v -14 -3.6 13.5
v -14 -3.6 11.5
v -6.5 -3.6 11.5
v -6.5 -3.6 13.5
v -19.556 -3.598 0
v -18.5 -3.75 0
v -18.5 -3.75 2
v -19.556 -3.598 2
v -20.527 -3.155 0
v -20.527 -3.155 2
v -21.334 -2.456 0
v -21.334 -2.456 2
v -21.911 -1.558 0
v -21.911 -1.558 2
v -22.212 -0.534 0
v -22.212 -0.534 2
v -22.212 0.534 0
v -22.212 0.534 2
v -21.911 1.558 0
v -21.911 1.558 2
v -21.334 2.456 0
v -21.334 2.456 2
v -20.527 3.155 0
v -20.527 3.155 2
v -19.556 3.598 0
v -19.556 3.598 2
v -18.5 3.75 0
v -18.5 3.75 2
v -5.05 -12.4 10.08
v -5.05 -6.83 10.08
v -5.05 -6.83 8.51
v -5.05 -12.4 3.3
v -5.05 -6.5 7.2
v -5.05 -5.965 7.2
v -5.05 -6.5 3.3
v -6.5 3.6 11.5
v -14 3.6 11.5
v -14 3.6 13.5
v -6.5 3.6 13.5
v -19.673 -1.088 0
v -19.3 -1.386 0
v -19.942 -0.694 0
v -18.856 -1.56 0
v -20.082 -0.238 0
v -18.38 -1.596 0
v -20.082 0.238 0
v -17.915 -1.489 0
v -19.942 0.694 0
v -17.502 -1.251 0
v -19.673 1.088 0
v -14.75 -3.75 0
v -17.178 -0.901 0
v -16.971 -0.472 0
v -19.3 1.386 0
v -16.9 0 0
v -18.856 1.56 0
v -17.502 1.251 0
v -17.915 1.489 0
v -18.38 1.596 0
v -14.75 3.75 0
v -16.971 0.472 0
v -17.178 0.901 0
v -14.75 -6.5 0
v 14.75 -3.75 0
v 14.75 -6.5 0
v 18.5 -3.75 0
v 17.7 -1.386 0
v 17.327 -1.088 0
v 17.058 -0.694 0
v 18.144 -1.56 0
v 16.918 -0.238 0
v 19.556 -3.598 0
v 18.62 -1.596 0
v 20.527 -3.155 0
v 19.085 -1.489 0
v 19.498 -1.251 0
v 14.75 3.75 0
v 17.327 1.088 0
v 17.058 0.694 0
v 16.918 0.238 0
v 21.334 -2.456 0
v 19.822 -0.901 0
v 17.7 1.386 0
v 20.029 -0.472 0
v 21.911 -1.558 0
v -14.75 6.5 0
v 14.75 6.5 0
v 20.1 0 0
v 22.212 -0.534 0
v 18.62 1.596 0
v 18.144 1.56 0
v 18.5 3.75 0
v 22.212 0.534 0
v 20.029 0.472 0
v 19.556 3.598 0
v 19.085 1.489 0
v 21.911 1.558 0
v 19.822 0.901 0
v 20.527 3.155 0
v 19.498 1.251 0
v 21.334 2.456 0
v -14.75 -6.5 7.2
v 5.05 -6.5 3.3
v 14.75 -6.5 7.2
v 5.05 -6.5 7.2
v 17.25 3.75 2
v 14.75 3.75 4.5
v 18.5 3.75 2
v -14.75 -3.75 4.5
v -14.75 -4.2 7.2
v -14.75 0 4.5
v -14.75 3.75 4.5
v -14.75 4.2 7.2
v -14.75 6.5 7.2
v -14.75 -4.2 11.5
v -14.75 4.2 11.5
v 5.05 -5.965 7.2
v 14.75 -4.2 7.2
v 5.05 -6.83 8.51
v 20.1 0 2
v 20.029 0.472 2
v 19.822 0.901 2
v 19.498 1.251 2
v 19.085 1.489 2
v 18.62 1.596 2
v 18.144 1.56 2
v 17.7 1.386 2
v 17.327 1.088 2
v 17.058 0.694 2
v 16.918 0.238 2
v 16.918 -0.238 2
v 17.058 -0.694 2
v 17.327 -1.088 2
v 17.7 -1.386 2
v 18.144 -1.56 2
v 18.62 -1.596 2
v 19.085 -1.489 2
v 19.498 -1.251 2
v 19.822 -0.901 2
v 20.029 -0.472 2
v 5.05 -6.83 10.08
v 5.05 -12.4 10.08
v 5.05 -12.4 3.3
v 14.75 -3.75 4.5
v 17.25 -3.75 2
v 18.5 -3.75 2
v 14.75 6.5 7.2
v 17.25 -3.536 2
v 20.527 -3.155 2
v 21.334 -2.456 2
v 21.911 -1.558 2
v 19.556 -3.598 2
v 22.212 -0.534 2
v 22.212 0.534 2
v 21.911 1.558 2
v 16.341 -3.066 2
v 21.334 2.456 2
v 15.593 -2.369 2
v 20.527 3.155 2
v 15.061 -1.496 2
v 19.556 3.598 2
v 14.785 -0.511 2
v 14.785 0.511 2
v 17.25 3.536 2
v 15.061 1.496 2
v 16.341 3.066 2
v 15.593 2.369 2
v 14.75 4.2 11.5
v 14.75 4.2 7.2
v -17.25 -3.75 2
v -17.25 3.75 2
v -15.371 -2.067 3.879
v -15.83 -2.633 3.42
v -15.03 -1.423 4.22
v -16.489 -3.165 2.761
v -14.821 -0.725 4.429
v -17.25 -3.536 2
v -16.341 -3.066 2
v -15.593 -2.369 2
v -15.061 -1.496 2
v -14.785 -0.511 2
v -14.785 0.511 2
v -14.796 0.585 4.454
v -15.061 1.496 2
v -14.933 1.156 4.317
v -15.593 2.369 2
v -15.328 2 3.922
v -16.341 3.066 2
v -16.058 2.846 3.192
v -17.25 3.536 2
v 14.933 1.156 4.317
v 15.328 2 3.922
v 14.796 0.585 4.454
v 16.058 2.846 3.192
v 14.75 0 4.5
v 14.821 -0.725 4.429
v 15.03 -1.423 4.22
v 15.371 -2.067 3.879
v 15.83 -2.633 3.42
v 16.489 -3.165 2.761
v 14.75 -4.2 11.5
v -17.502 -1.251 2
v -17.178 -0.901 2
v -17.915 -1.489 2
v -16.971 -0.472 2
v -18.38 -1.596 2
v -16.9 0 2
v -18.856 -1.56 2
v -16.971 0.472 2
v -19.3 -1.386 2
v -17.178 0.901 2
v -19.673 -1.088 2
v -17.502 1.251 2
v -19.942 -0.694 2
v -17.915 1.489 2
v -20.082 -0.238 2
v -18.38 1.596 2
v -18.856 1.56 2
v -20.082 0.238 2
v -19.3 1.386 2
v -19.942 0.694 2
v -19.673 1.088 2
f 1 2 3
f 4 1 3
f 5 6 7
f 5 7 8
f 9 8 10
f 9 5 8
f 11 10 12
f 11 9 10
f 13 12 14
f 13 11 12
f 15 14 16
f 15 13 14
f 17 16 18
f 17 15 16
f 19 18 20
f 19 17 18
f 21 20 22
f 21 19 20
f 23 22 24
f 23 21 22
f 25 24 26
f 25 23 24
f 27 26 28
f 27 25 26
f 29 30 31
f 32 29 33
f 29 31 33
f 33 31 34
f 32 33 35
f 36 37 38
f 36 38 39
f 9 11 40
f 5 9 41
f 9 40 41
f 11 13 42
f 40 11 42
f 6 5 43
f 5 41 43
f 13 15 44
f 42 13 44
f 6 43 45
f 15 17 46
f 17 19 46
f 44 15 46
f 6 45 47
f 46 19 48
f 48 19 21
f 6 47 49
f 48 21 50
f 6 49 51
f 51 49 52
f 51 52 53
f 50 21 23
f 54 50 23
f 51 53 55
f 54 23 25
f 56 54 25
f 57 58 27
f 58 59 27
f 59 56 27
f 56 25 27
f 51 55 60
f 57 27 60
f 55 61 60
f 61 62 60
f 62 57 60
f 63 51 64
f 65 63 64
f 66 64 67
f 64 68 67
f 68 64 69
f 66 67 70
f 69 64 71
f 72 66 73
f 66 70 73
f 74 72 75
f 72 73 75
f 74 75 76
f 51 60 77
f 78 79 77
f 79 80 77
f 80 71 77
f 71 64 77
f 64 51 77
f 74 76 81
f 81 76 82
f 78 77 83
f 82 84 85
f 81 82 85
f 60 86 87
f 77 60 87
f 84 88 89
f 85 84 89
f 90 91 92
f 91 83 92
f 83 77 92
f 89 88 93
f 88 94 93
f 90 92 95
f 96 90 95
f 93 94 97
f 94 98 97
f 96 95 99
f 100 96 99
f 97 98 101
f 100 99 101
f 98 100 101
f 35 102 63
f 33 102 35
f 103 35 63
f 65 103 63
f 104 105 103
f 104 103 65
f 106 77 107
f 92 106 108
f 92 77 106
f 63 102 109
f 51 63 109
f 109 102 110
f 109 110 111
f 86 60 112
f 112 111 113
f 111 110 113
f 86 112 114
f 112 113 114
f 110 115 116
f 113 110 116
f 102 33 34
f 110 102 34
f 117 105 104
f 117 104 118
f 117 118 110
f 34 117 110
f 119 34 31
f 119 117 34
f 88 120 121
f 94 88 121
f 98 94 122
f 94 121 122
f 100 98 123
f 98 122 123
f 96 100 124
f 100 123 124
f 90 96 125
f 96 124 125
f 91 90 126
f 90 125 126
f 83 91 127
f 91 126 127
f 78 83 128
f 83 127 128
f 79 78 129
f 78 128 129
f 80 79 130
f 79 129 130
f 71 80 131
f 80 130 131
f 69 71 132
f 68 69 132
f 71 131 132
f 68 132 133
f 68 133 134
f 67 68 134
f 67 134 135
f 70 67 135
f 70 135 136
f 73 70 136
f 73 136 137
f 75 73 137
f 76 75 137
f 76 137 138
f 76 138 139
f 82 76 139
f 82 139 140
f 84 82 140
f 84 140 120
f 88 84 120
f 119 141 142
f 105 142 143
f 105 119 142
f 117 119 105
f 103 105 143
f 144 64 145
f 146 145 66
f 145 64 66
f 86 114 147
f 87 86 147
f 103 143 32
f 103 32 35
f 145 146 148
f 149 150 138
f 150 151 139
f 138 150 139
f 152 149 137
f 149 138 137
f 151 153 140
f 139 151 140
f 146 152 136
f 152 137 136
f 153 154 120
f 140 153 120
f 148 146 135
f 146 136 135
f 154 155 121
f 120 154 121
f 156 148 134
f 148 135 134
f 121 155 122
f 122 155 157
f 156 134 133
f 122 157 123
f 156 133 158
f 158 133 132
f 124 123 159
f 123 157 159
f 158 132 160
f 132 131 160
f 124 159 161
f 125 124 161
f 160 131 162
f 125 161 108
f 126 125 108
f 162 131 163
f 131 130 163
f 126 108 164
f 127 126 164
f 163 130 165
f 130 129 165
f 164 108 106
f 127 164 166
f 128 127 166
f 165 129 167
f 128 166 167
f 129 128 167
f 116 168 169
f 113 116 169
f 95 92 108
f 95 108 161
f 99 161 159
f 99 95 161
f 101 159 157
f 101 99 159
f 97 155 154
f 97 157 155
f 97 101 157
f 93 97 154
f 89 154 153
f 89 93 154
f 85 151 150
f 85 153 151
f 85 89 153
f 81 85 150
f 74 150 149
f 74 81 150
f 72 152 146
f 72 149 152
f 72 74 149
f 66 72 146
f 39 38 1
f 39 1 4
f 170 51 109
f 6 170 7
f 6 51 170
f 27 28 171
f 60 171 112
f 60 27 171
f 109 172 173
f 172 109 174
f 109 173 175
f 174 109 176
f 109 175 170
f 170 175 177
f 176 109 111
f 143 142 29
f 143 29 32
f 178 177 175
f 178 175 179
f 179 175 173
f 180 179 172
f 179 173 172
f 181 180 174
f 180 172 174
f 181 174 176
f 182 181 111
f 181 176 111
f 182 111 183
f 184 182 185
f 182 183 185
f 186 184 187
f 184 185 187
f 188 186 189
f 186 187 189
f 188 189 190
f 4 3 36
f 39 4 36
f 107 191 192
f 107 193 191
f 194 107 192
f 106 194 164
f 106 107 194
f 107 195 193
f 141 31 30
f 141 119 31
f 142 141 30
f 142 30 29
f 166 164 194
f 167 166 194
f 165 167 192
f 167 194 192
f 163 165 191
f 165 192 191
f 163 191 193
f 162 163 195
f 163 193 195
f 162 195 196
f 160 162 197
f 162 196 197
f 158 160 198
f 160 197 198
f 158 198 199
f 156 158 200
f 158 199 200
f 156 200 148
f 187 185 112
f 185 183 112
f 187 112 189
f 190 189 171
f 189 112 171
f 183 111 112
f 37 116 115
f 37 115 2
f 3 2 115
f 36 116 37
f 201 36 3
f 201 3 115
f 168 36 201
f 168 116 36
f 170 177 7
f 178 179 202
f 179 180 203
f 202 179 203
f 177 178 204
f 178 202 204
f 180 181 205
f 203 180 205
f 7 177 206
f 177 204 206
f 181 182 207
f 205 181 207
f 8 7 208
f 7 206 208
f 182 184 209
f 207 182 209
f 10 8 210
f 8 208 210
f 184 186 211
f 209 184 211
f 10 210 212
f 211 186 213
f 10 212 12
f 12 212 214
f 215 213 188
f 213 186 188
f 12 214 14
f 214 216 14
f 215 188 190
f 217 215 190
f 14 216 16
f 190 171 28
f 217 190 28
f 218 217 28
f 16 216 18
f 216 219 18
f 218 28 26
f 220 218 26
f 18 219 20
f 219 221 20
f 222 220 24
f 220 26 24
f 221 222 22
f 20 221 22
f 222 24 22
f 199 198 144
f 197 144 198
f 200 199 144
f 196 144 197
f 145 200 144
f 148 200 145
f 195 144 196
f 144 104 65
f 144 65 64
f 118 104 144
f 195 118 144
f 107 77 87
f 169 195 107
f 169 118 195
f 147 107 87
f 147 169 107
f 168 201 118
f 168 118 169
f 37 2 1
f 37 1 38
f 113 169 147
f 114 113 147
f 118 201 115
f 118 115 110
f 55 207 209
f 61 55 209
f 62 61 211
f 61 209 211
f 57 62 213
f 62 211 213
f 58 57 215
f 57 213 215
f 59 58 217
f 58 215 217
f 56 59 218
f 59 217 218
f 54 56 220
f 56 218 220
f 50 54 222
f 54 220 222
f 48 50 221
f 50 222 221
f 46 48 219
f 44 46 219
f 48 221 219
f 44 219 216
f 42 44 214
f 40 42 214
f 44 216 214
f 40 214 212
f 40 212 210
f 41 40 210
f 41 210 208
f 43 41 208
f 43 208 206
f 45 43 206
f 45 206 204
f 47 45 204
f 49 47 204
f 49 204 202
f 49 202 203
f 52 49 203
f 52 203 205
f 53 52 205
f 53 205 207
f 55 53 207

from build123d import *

# Parameters (mm, degrees)
ESQUISSE1_W                         = 29.5
ESQUISSE1_H                         = 13
BOSS_EXTRU_1_DEPTH                  = 11.5
ESQUISSE2_W                         = 4.3
ESQUISSE2_H                         = 2.3
ENL_V_MAT_EXTRU_1_DEPTH             = 30.5
ESQUISSE3_W                         = 4.3
ESQUISSE3_H                         = 2.3
ENL_V_MAT_EXTRU_2_DEPTH             = 30.5
BOSS_EXTRU_2_DEPTH                  = 2
BOSS_EXTRU_3_DEPTH                  = 2
ESQUISSE6_W                         = 7.5
ESQUISSE6_H                         = 7.2
BOSS_EXTRU_4_DEPTH                  = 2
DIAM_TRE_DU_PER_AGE_3_2_3_2_1_D     = 3.2
DIAM_TRE_DU_PER_AGE_3_2_3_2_1_DEPTH = 13.5
BOSS_EXTRU_5_DEPTH                  = 5.05
BOSS_EXTRU_5_DEPTH_BACK             = 5.05
BOSS_EXTRU_6_DEPTH                  = 7.5
ESQUISSE11_R                        = 3.75
ENL_V_MAT_EXTRU_3_DEPTH             = 9.5


with BuildPart() as part:
    # Esquisse1 → Boss.-Extru.1 (new body)
    with BuildSketch(Plane.XY.offset(11.5)):
        Rectangle(ESQUISSE1_W, ESQUISSE1_H)
    extrude(amount=-BOSS_EXTRU_1_DEPTH)

    # Esquisse2 → Enlèv. mat.-Extru.1 (cut, through all)
    with BuildSketch(Plane(origin=(14.75, 0, 0), x_dir=(0, 0, -1), z_dir=(1, 0, 0))):
        with Locations((-9.35, -5.35)):
            Rectangle(ESQUISSE2_W, ESQUISSE2_H)
    extrude(amount=-ENL_V_MAT_EXTRU_1_DEPTH, mode=Mode.SUBTRACT)

    # Esquisse3 → Enlèv. mat.-Extru.2 (cut, through all)
    with BuildSketch(Plane(origin=(14.75, 0, 0), x_dir=(0, 0, -1), z_dir=(1, 0, 0))):
        with Locations((-9.35, 5.35)):
            Rectangle(ESQUISSE3_W, ESQUISSE3_H)
    extrude(amount=-ENL_V_MAT_EXTRU_2_DEPTH, mode=Mode.SUBTRACT)

    # Esquisse4 → Boss.-Extru.2 (add)
    with BuildSketch(Plane(origin=(0, 0, 0), x_dir=(-1, 0, 0), z_dir=(0, 0, -1))):
        with BuildLine():
            Line((-14.75, -3.75), (-14.75, 3.75))
            Line((-14.75, 3.75), (-18.5, 3.75))
            ThreePointArc((-18.5, 3.75), (-22.25, 0), (-18.5, -3.75))
            Line((-18.5, -3.75), (-14.75, -3.75))
        make_face()
    extrude(amount=-BOSS_EXTRU_2_DEPTH)

    # Esquisse5 → Boss.-Extru.3 (add)
    with BuildSketch(Plane(origin=(0, 0, 0), x_dir=(-1, 0, 0), z_dir=(0, 0, -1))):
        with BuildLine():
            Line((18.5, 3.75), (14.75, 3.75))
            Line((14.75, 3.75), (14.75, -3.75))
            Line((14.75, -3.75), (18.5, -3.75))
            ThreePointArc((18.5, -3.75), (22.25, 0), (18.5, 3.75))
        make_face()
    extrude(amount=-BOSS_EXTRU_3_DEPTH)

    # Esquisse6 → Boss.-Extru.4 (add)
    with BuildSketch(Plane.XY.offset(11.5)):
        with Locations((-10.25, 0)):
            Rectangle(ESQUISSE6_W, ESQUISSE6_H)
    extrude(amount=BOSS_EXTRU_4_DEPTH)

    # Diamètre du perçage Ø3.2 (3.2)1
    with Locations(Plane(origin=(0, 0, 0), x_dir=(-1, 0, 0), z_dir=(0, 0, -1))):
        with Locations((-18.5, 0), (18.5, 0)):
            Hole(DIAM_TRE_DU_PER_AGE_3_2_3_2_1_D / 2, depth=DIAM_TRE_DU_PER_AGE_3_2_3_2_1_DEPTH)

    # Esquisse9 → Boss.-Extru.5 (add, two sides)
    with BuildSketch(Plane(origin=(0, 0, 0), x_dir=(0, 0, -1), z_dir=(1, 0, 0))) as boss_extru_5_sk:
        Polygon((-8.51, -6.83), (-10.08, -6.83), (-10.08, -12.4), (-3.3, -12.4), (-3.3, -6.5), (-7.2, -6.5), (-7.2, -5.964667694), align=None)
    extrude(amount=BOSS_EXTRU_5_DEPTH)
    extrude(boss_extru_5_sk.sketch, amount=-BOSS_EXTRU_5_DEPTH_BACK)

    # Esquisse10 → Boss.-Extru.6 (add)
    with BuildSketch(Plane(origin=(0, 3.75, 0), x_dir=(1, 0, 0), z_dir=(0, 1, 0))):
        Polygon((14.75, -2), (14.75, -4.5), (17.25, -2), align=None)
        Polygon((-14.75, -2), (-14.75, -4.5), (-17.25, -2), align=None)
    extrude(amount=-BOSS_EXTRU_6_DEPTH)

    # Esquisse11 → Enlèv. mat.-Extru.3 (cut)
    with BuildSketch(Plane.XY.offset(11.5)):
        with Locations((18.5, 0)):
            Circle(ESQUISSE11_R)
        with Locations((-18.5, 0)):
            Circle(ESQUISSE11_R)
    extrude(amount=-ENL_V_MAT_EXTRU_3_DEPTH, mode=Mode.SUBTRACT)


solid = part.part
